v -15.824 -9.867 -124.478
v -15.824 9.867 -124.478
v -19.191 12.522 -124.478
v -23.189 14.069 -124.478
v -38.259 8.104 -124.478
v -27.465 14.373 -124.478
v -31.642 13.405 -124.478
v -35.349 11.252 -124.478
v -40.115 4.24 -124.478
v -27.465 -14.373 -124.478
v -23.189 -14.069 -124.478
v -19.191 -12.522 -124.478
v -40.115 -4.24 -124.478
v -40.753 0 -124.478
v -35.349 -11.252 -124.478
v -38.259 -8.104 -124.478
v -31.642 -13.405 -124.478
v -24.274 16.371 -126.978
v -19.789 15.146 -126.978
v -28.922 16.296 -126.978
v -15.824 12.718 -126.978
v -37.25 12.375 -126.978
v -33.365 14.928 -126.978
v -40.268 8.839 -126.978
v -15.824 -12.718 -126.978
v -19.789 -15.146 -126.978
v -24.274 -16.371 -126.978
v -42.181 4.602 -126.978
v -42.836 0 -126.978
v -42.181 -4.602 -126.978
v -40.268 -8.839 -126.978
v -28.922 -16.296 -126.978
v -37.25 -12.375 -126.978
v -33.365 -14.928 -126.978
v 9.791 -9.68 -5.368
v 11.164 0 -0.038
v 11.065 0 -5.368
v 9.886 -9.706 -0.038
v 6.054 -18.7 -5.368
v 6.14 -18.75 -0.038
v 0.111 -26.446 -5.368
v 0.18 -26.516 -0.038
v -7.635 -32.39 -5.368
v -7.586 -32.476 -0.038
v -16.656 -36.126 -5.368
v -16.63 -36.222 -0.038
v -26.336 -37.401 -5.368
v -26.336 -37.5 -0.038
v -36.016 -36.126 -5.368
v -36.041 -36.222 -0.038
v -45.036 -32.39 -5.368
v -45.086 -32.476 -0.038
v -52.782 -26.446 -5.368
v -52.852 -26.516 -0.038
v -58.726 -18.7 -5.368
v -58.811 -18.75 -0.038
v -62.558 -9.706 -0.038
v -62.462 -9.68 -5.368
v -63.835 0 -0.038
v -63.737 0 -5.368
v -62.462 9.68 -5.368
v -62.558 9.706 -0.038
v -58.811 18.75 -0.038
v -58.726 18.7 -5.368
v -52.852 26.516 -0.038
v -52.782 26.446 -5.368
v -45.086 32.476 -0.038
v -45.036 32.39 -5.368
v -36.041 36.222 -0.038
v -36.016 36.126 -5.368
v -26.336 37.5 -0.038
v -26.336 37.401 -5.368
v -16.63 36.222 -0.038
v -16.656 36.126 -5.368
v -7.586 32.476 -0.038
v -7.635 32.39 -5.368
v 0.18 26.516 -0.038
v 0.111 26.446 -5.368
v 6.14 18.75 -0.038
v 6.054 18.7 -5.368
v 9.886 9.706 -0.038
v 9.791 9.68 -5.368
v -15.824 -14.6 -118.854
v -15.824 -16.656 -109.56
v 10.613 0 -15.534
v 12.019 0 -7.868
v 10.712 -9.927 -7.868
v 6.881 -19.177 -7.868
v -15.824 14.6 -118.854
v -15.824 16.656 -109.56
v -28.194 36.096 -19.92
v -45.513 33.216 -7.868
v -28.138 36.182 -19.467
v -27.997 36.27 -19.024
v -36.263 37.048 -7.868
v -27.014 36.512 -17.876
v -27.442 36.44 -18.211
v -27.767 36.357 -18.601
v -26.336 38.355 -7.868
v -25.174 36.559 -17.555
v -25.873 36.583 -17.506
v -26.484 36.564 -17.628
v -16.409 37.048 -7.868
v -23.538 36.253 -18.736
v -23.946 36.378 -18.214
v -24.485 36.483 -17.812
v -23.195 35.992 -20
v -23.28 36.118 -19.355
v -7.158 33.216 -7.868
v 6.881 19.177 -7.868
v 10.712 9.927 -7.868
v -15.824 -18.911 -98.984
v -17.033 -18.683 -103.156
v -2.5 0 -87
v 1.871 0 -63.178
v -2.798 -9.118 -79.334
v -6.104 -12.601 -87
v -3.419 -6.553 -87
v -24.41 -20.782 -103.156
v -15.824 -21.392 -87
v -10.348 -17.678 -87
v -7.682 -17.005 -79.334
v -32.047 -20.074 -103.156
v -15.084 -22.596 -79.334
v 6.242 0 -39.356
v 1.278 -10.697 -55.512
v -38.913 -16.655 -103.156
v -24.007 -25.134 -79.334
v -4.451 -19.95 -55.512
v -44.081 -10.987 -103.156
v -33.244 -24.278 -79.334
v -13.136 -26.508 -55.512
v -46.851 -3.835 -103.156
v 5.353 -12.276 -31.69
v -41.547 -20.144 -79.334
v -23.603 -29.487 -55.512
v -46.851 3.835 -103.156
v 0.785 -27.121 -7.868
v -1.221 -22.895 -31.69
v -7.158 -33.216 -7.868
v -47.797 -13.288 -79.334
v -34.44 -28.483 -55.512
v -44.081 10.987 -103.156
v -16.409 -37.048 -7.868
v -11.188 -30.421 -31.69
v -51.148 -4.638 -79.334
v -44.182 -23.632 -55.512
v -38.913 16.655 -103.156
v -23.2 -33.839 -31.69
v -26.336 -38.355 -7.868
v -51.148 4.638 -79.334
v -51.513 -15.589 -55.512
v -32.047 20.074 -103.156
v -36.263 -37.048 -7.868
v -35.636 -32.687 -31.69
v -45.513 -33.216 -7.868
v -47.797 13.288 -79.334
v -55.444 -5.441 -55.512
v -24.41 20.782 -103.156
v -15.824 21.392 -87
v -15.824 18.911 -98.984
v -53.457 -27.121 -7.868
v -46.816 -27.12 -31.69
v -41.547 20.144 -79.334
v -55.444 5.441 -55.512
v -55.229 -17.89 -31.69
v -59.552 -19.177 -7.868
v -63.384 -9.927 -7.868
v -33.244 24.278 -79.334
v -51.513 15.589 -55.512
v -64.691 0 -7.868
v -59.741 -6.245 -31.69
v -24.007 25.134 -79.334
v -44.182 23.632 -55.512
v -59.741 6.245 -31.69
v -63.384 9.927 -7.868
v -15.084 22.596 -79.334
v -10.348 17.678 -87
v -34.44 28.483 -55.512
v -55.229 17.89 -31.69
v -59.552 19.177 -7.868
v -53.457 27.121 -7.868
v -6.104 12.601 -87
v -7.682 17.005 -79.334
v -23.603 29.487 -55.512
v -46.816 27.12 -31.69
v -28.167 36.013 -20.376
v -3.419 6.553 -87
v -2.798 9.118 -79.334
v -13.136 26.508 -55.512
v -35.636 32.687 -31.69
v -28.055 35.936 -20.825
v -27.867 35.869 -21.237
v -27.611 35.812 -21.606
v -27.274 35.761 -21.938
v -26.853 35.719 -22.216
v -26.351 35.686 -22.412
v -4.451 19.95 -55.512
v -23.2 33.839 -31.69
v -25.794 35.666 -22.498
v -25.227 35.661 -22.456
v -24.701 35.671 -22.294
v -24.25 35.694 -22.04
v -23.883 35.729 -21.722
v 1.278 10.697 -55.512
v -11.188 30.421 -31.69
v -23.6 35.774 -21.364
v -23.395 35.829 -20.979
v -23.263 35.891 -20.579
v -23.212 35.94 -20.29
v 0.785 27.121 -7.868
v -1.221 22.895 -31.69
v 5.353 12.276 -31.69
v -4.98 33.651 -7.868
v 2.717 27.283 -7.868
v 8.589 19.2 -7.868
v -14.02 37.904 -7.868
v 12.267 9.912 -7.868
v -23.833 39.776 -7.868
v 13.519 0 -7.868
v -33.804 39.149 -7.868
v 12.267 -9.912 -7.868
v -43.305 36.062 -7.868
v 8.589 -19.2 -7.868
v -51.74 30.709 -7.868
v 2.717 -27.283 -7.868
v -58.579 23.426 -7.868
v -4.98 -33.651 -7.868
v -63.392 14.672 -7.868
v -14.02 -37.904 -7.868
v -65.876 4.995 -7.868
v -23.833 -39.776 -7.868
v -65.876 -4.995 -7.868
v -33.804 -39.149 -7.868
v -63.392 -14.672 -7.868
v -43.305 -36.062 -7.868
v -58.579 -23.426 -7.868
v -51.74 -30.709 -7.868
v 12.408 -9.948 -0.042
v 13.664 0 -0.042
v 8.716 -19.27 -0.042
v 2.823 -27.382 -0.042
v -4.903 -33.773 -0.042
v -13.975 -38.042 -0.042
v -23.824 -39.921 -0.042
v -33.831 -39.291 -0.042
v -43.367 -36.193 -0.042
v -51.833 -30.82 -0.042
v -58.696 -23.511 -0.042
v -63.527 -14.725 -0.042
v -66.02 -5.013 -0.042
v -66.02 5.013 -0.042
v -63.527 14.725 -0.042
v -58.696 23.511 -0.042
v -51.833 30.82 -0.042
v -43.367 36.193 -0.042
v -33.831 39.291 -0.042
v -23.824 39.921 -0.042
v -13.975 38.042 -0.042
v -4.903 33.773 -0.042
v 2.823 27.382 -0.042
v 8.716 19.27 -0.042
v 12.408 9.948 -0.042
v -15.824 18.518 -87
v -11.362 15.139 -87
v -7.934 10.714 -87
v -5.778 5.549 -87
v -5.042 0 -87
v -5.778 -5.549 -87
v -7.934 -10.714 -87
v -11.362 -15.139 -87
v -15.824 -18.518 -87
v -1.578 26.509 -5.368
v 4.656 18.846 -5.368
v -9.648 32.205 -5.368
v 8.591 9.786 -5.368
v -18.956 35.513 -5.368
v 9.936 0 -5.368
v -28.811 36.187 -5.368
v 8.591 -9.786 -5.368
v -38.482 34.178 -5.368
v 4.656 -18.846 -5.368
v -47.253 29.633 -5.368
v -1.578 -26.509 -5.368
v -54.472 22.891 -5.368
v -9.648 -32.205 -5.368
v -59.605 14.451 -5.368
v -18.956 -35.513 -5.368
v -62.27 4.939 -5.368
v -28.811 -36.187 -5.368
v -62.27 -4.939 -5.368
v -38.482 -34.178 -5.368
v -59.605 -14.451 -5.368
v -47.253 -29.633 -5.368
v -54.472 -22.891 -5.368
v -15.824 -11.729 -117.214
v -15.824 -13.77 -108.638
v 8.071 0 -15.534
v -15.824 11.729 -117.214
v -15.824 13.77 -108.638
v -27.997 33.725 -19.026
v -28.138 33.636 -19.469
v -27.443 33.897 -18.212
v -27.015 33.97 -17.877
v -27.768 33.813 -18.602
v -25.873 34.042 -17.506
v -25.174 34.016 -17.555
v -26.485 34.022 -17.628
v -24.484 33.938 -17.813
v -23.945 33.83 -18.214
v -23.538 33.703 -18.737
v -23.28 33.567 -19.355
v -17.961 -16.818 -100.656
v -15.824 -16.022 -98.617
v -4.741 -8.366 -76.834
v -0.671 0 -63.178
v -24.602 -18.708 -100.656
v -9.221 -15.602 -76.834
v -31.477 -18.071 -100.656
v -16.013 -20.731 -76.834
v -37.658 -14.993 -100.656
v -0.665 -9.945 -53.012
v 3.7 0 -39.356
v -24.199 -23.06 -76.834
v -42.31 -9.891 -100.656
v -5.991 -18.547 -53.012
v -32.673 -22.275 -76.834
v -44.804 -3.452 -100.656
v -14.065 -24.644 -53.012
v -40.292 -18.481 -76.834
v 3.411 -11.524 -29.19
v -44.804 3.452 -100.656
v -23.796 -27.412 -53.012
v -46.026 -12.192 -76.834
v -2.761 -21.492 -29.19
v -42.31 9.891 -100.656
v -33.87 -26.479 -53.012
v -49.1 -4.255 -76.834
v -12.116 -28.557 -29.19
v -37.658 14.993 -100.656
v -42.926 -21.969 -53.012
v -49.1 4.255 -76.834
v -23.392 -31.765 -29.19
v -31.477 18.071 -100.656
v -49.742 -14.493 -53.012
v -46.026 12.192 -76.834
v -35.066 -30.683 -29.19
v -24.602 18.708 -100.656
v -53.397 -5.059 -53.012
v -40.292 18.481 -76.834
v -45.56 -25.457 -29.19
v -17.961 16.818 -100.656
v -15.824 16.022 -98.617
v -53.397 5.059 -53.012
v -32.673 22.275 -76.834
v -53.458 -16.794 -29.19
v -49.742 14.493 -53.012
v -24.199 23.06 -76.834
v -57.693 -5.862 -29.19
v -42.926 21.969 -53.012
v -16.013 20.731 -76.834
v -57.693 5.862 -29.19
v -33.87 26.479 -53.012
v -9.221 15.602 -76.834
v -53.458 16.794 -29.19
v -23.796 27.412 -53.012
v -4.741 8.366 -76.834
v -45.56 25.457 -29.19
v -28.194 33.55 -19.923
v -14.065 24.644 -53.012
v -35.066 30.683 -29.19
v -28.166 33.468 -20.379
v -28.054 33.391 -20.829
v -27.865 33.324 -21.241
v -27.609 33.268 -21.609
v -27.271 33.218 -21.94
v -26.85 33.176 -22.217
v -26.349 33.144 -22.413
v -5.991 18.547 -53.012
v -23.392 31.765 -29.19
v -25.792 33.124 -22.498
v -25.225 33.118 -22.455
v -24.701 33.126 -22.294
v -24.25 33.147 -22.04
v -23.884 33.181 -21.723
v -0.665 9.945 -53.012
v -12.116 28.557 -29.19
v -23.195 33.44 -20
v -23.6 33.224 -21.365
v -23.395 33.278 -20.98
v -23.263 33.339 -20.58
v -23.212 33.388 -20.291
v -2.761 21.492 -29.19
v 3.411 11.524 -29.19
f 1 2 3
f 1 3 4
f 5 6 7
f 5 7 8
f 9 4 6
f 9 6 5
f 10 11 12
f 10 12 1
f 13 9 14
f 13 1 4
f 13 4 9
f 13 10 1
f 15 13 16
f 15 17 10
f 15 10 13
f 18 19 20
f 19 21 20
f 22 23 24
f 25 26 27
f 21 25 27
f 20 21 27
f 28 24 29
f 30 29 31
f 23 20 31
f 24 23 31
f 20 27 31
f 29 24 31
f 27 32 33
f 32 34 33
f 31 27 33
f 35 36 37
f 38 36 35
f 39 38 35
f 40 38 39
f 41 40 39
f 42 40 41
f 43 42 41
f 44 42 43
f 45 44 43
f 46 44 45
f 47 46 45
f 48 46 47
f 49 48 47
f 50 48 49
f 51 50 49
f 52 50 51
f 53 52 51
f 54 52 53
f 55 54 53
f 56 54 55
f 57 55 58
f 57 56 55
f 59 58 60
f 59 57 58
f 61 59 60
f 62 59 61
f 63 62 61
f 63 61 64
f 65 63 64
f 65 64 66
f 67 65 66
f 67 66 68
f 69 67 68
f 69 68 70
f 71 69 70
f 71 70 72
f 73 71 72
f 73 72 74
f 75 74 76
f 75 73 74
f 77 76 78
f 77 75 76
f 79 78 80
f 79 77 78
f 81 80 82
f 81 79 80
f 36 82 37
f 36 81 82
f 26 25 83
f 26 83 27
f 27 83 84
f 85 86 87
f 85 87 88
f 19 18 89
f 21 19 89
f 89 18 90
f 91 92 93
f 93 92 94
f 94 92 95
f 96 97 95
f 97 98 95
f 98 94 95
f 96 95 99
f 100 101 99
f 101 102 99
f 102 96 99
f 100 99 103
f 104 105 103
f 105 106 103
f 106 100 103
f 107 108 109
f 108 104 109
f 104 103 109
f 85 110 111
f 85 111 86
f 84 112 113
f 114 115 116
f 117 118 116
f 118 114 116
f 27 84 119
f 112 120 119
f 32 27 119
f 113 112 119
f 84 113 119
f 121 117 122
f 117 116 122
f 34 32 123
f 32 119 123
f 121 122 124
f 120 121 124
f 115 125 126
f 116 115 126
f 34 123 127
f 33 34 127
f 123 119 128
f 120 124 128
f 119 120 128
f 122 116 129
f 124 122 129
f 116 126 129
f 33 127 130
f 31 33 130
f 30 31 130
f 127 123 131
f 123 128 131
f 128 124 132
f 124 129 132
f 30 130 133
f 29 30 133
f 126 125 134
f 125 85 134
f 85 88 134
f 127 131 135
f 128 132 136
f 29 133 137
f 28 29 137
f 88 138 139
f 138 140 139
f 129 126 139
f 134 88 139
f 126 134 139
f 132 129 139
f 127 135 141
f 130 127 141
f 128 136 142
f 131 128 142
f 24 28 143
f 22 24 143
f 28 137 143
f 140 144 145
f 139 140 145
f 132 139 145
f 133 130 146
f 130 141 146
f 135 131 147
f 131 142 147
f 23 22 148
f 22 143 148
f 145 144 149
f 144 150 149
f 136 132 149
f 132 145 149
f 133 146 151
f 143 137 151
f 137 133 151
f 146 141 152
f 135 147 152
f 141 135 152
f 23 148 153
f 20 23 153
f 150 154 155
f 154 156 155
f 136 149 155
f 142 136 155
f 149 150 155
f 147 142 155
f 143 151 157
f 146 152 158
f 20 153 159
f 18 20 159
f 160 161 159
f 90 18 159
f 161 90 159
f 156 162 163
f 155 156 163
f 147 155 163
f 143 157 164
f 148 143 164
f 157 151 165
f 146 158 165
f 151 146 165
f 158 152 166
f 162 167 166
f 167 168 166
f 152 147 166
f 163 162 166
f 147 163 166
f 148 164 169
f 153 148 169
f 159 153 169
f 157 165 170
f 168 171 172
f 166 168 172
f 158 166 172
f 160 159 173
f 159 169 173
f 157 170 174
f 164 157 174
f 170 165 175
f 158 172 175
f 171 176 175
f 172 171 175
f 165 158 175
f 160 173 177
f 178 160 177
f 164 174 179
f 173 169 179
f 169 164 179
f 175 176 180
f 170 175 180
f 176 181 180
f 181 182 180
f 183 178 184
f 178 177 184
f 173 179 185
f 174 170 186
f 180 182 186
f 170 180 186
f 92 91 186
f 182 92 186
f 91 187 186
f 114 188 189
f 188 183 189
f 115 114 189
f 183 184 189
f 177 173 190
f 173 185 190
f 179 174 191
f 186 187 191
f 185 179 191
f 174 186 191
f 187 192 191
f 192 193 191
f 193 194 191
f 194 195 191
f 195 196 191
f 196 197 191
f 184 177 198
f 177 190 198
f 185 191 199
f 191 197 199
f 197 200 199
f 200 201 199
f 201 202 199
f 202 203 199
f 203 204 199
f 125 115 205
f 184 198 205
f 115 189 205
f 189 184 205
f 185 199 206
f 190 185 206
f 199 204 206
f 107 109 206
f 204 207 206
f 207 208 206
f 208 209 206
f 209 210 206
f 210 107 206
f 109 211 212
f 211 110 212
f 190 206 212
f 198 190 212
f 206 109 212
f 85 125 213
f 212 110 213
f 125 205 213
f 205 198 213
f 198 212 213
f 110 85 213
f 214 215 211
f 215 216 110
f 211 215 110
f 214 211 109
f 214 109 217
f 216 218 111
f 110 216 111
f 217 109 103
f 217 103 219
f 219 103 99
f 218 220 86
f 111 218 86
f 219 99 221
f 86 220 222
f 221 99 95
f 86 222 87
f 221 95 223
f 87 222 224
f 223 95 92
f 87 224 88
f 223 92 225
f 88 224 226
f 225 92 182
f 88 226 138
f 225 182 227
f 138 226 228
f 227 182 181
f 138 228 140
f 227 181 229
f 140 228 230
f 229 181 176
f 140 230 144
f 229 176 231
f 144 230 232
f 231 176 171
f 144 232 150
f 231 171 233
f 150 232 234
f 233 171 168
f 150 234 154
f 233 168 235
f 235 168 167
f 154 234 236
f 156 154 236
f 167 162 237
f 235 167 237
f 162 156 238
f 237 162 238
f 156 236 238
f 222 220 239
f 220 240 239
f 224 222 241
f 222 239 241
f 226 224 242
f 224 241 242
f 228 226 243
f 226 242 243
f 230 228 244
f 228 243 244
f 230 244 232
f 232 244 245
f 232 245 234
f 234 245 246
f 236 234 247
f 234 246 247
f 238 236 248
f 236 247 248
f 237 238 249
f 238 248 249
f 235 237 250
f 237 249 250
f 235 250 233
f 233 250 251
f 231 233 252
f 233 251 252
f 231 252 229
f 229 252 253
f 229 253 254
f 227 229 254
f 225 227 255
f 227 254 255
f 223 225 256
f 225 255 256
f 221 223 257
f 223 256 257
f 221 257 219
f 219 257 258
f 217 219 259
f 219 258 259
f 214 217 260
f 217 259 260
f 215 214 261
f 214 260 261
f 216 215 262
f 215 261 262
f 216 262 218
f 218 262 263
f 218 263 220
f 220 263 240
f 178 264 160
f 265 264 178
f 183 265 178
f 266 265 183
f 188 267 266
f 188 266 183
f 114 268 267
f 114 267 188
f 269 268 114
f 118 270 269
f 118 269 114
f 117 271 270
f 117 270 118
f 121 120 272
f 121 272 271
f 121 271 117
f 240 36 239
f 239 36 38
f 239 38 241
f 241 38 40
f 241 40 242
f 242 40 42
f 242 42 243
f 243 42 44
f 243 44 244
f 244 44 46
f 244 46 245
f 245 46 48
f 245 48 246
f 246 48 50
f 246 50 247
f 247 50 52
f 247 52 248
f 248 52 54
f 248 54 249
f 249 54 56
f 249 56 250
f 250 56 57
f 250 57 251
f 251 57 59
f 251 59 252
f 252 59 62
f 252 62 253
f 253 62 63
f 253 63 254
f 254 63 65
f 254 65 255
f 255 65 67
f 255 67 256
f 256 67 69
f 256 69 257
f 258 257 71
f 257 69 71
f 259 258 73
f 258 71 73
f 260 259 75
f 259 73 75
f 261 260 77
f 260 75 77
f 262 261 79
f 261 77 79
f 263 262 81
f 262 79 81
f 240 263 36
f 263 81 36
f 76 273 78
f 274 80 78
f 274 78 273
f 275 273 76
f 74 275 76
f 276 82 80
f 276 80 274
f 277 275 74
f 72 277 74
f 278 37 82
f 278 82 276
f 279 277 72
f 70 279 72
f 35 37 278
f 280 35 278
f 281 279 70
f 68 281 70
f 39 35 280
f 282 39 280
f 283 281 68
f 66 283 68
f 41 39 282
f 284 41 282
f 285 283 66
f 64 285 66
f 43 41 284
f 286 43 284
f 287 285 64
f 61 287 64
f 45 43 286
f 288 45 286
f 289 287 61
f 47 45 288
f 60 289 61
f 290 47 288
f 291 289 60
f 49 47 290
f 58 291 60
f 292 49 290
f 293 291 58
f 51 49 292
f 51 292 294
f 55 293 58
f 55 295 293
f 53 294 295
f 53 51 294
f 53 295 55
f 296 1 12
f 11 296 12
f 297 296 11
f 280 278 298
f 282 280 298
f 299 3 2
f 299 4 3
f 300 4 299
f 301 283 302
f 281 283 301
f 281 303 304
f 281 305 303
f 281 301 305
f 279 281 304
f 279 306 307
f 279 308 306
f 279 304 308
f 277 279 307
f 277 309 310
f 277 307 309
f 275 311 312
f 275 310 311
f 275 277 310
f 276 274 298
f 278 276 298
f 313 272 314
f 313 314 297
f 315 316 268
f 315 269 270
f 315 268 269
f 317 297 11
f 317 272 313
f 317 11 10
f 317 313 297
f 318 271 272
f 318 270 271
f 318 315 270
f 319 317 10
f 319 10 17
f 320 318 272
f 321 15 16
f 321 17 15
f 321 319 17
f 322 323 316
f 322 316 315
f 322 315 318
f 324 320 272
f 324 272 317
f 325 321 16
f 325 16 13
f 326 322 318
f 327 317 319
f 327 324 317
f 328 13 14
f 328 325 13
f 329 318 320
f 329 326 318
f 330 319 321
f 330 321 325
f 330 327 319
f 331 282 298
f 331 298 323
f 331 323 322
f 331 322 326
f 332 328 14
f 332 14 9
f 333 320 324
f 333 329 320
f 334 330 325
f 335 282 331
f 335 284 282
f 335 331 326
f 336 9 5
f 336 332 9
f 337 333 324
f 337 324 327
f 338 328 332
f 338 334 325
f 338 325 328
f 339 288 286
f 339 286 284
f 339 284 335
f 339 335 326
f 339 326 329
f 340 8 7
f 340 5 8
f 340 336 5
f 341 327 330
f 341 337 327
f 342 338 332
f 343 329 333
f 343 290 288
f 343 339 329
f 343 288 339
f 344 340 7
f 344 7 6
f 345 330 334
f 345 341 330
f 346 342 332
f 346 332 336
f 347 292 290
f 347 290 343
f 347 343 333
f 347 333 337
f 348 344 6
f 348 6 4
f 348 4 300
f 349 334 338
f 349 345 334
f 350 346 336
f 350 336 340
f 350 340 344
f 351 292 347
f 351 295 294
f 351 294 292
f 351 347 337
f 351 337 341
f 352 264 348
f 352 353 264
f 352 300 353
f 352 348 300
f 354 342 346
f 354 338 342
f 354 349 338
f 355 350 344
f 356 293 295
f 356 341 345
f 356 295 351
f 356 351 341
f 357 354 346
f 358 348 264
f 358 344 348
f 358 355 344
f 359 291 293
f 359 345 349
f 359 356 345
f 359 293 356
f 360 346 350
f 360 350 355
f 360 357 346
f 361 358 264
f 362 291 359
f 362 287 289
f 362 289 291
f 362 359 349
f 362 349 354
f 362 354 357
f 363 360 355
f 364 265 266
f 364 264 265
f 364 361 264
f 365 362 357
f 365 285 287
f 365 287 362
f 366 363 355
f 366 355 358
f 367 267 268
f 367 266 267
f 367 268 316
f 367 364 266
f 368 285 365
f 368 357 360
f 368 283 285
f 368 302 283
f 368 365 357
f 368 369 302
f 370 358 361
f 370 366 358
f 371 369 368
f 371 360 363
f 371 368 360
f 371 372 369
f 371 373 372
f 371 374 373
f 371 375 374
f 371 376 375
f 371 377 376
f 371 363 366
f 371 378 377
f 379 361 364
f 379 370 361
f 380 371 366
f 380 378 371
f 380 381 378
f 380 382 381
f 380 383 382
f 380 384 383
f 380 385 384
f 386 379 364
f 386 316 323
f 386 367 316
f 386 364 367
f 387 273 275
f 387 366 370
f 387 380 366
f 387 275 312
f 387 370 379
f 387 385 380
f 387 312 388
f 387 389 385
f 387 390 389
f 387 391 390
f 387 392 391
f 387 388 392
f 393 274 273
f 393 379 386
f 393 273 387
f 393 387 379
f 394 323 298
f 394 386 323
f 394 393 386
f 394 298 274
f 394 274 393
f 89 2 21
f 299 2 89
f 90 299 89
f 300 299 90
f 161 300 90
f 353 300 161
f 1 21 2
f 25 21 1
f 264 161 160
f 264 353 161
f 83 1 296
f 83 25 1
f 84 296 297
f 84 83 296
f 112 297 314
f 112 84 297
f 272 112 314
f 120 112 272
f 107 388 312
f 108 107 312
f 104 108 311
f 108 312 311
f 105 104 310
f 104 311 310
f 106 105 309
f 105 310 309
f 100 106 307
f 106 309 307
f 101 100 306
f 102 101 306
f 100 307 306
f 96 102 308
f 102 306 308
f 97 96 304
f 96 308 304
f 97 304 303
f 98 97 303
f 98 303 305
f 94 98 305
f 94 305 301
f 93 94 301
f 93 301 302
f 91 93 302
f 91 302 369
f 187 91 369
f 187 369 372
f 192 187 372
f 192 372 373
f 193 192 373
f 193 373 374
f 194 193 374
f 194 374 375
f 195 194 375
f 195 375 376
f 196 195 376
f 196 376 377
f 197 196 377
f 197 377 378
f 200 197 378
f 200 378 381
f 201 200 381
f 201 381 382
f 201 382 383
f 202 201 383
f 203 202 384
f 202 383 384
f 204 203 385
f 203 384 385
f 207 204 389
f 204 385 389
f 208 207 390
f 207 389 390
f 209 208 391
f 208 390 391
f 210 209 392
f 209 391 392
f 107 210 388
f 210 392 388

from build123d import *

# Parameters (mm, degrees)
F2_T     = -2.5
F3_W     = 23.2394424225
F3_H     = 43.3458978903
F3_R     = 2.5
F4_DEPTH = 40.0009476822
F5_DEPTH = 40.0009476822


with BuildPart() as f1:
    # F0 (on Front) → F1 (revolve)
    with BuildSketch(Plane.XZ):
        Polygon((-26.3357340748, 0.0224007943), (-26.3357340748, -126.9775992057), (-9.8357340748, -126.9775992057), (12.0191977024, -7.8678405553), (13.5191977024, -7.8678405553), (13.6642136074, -0.0422940365), align=None)
    revolve(axis=Axis((-26.3357340748, 0, -63.4775992057), (0, 0, -1)))

    # F2
    f2_openings = [f1.faces().sort_by_distance(p)[0] for p in [
        (-46.335708, 0, -0.009947),
    ]]
    offset(amount=F2_T, openings=f2_openings, kind=Kind.INTERSECTION)

    # F3 (on Front) → F4 (cut, through all)
    with BuildSketch(Plane.XZ):
        with Locations((-4.2045409791, -108.6729489452)):
            Rectangle(F3_W, F3_H)
        with Locations((-25.6951171905, -20)):
            Circle(F3_R)
    extrude(amount=-F4_DEPTH, mode=Mode.SUBTRACT)

    # F3 (on Front) → F5 (cut, through all)
    with BuildSketch(Plane.XZ):
        with Locations((-4.2045409791, -108.6729489452)):
            Rectangle(F3_W, F3_H)
    extrude(amount=F5_DEPTH, mode=Mode.SUBTRACT)


solid = f1.part
